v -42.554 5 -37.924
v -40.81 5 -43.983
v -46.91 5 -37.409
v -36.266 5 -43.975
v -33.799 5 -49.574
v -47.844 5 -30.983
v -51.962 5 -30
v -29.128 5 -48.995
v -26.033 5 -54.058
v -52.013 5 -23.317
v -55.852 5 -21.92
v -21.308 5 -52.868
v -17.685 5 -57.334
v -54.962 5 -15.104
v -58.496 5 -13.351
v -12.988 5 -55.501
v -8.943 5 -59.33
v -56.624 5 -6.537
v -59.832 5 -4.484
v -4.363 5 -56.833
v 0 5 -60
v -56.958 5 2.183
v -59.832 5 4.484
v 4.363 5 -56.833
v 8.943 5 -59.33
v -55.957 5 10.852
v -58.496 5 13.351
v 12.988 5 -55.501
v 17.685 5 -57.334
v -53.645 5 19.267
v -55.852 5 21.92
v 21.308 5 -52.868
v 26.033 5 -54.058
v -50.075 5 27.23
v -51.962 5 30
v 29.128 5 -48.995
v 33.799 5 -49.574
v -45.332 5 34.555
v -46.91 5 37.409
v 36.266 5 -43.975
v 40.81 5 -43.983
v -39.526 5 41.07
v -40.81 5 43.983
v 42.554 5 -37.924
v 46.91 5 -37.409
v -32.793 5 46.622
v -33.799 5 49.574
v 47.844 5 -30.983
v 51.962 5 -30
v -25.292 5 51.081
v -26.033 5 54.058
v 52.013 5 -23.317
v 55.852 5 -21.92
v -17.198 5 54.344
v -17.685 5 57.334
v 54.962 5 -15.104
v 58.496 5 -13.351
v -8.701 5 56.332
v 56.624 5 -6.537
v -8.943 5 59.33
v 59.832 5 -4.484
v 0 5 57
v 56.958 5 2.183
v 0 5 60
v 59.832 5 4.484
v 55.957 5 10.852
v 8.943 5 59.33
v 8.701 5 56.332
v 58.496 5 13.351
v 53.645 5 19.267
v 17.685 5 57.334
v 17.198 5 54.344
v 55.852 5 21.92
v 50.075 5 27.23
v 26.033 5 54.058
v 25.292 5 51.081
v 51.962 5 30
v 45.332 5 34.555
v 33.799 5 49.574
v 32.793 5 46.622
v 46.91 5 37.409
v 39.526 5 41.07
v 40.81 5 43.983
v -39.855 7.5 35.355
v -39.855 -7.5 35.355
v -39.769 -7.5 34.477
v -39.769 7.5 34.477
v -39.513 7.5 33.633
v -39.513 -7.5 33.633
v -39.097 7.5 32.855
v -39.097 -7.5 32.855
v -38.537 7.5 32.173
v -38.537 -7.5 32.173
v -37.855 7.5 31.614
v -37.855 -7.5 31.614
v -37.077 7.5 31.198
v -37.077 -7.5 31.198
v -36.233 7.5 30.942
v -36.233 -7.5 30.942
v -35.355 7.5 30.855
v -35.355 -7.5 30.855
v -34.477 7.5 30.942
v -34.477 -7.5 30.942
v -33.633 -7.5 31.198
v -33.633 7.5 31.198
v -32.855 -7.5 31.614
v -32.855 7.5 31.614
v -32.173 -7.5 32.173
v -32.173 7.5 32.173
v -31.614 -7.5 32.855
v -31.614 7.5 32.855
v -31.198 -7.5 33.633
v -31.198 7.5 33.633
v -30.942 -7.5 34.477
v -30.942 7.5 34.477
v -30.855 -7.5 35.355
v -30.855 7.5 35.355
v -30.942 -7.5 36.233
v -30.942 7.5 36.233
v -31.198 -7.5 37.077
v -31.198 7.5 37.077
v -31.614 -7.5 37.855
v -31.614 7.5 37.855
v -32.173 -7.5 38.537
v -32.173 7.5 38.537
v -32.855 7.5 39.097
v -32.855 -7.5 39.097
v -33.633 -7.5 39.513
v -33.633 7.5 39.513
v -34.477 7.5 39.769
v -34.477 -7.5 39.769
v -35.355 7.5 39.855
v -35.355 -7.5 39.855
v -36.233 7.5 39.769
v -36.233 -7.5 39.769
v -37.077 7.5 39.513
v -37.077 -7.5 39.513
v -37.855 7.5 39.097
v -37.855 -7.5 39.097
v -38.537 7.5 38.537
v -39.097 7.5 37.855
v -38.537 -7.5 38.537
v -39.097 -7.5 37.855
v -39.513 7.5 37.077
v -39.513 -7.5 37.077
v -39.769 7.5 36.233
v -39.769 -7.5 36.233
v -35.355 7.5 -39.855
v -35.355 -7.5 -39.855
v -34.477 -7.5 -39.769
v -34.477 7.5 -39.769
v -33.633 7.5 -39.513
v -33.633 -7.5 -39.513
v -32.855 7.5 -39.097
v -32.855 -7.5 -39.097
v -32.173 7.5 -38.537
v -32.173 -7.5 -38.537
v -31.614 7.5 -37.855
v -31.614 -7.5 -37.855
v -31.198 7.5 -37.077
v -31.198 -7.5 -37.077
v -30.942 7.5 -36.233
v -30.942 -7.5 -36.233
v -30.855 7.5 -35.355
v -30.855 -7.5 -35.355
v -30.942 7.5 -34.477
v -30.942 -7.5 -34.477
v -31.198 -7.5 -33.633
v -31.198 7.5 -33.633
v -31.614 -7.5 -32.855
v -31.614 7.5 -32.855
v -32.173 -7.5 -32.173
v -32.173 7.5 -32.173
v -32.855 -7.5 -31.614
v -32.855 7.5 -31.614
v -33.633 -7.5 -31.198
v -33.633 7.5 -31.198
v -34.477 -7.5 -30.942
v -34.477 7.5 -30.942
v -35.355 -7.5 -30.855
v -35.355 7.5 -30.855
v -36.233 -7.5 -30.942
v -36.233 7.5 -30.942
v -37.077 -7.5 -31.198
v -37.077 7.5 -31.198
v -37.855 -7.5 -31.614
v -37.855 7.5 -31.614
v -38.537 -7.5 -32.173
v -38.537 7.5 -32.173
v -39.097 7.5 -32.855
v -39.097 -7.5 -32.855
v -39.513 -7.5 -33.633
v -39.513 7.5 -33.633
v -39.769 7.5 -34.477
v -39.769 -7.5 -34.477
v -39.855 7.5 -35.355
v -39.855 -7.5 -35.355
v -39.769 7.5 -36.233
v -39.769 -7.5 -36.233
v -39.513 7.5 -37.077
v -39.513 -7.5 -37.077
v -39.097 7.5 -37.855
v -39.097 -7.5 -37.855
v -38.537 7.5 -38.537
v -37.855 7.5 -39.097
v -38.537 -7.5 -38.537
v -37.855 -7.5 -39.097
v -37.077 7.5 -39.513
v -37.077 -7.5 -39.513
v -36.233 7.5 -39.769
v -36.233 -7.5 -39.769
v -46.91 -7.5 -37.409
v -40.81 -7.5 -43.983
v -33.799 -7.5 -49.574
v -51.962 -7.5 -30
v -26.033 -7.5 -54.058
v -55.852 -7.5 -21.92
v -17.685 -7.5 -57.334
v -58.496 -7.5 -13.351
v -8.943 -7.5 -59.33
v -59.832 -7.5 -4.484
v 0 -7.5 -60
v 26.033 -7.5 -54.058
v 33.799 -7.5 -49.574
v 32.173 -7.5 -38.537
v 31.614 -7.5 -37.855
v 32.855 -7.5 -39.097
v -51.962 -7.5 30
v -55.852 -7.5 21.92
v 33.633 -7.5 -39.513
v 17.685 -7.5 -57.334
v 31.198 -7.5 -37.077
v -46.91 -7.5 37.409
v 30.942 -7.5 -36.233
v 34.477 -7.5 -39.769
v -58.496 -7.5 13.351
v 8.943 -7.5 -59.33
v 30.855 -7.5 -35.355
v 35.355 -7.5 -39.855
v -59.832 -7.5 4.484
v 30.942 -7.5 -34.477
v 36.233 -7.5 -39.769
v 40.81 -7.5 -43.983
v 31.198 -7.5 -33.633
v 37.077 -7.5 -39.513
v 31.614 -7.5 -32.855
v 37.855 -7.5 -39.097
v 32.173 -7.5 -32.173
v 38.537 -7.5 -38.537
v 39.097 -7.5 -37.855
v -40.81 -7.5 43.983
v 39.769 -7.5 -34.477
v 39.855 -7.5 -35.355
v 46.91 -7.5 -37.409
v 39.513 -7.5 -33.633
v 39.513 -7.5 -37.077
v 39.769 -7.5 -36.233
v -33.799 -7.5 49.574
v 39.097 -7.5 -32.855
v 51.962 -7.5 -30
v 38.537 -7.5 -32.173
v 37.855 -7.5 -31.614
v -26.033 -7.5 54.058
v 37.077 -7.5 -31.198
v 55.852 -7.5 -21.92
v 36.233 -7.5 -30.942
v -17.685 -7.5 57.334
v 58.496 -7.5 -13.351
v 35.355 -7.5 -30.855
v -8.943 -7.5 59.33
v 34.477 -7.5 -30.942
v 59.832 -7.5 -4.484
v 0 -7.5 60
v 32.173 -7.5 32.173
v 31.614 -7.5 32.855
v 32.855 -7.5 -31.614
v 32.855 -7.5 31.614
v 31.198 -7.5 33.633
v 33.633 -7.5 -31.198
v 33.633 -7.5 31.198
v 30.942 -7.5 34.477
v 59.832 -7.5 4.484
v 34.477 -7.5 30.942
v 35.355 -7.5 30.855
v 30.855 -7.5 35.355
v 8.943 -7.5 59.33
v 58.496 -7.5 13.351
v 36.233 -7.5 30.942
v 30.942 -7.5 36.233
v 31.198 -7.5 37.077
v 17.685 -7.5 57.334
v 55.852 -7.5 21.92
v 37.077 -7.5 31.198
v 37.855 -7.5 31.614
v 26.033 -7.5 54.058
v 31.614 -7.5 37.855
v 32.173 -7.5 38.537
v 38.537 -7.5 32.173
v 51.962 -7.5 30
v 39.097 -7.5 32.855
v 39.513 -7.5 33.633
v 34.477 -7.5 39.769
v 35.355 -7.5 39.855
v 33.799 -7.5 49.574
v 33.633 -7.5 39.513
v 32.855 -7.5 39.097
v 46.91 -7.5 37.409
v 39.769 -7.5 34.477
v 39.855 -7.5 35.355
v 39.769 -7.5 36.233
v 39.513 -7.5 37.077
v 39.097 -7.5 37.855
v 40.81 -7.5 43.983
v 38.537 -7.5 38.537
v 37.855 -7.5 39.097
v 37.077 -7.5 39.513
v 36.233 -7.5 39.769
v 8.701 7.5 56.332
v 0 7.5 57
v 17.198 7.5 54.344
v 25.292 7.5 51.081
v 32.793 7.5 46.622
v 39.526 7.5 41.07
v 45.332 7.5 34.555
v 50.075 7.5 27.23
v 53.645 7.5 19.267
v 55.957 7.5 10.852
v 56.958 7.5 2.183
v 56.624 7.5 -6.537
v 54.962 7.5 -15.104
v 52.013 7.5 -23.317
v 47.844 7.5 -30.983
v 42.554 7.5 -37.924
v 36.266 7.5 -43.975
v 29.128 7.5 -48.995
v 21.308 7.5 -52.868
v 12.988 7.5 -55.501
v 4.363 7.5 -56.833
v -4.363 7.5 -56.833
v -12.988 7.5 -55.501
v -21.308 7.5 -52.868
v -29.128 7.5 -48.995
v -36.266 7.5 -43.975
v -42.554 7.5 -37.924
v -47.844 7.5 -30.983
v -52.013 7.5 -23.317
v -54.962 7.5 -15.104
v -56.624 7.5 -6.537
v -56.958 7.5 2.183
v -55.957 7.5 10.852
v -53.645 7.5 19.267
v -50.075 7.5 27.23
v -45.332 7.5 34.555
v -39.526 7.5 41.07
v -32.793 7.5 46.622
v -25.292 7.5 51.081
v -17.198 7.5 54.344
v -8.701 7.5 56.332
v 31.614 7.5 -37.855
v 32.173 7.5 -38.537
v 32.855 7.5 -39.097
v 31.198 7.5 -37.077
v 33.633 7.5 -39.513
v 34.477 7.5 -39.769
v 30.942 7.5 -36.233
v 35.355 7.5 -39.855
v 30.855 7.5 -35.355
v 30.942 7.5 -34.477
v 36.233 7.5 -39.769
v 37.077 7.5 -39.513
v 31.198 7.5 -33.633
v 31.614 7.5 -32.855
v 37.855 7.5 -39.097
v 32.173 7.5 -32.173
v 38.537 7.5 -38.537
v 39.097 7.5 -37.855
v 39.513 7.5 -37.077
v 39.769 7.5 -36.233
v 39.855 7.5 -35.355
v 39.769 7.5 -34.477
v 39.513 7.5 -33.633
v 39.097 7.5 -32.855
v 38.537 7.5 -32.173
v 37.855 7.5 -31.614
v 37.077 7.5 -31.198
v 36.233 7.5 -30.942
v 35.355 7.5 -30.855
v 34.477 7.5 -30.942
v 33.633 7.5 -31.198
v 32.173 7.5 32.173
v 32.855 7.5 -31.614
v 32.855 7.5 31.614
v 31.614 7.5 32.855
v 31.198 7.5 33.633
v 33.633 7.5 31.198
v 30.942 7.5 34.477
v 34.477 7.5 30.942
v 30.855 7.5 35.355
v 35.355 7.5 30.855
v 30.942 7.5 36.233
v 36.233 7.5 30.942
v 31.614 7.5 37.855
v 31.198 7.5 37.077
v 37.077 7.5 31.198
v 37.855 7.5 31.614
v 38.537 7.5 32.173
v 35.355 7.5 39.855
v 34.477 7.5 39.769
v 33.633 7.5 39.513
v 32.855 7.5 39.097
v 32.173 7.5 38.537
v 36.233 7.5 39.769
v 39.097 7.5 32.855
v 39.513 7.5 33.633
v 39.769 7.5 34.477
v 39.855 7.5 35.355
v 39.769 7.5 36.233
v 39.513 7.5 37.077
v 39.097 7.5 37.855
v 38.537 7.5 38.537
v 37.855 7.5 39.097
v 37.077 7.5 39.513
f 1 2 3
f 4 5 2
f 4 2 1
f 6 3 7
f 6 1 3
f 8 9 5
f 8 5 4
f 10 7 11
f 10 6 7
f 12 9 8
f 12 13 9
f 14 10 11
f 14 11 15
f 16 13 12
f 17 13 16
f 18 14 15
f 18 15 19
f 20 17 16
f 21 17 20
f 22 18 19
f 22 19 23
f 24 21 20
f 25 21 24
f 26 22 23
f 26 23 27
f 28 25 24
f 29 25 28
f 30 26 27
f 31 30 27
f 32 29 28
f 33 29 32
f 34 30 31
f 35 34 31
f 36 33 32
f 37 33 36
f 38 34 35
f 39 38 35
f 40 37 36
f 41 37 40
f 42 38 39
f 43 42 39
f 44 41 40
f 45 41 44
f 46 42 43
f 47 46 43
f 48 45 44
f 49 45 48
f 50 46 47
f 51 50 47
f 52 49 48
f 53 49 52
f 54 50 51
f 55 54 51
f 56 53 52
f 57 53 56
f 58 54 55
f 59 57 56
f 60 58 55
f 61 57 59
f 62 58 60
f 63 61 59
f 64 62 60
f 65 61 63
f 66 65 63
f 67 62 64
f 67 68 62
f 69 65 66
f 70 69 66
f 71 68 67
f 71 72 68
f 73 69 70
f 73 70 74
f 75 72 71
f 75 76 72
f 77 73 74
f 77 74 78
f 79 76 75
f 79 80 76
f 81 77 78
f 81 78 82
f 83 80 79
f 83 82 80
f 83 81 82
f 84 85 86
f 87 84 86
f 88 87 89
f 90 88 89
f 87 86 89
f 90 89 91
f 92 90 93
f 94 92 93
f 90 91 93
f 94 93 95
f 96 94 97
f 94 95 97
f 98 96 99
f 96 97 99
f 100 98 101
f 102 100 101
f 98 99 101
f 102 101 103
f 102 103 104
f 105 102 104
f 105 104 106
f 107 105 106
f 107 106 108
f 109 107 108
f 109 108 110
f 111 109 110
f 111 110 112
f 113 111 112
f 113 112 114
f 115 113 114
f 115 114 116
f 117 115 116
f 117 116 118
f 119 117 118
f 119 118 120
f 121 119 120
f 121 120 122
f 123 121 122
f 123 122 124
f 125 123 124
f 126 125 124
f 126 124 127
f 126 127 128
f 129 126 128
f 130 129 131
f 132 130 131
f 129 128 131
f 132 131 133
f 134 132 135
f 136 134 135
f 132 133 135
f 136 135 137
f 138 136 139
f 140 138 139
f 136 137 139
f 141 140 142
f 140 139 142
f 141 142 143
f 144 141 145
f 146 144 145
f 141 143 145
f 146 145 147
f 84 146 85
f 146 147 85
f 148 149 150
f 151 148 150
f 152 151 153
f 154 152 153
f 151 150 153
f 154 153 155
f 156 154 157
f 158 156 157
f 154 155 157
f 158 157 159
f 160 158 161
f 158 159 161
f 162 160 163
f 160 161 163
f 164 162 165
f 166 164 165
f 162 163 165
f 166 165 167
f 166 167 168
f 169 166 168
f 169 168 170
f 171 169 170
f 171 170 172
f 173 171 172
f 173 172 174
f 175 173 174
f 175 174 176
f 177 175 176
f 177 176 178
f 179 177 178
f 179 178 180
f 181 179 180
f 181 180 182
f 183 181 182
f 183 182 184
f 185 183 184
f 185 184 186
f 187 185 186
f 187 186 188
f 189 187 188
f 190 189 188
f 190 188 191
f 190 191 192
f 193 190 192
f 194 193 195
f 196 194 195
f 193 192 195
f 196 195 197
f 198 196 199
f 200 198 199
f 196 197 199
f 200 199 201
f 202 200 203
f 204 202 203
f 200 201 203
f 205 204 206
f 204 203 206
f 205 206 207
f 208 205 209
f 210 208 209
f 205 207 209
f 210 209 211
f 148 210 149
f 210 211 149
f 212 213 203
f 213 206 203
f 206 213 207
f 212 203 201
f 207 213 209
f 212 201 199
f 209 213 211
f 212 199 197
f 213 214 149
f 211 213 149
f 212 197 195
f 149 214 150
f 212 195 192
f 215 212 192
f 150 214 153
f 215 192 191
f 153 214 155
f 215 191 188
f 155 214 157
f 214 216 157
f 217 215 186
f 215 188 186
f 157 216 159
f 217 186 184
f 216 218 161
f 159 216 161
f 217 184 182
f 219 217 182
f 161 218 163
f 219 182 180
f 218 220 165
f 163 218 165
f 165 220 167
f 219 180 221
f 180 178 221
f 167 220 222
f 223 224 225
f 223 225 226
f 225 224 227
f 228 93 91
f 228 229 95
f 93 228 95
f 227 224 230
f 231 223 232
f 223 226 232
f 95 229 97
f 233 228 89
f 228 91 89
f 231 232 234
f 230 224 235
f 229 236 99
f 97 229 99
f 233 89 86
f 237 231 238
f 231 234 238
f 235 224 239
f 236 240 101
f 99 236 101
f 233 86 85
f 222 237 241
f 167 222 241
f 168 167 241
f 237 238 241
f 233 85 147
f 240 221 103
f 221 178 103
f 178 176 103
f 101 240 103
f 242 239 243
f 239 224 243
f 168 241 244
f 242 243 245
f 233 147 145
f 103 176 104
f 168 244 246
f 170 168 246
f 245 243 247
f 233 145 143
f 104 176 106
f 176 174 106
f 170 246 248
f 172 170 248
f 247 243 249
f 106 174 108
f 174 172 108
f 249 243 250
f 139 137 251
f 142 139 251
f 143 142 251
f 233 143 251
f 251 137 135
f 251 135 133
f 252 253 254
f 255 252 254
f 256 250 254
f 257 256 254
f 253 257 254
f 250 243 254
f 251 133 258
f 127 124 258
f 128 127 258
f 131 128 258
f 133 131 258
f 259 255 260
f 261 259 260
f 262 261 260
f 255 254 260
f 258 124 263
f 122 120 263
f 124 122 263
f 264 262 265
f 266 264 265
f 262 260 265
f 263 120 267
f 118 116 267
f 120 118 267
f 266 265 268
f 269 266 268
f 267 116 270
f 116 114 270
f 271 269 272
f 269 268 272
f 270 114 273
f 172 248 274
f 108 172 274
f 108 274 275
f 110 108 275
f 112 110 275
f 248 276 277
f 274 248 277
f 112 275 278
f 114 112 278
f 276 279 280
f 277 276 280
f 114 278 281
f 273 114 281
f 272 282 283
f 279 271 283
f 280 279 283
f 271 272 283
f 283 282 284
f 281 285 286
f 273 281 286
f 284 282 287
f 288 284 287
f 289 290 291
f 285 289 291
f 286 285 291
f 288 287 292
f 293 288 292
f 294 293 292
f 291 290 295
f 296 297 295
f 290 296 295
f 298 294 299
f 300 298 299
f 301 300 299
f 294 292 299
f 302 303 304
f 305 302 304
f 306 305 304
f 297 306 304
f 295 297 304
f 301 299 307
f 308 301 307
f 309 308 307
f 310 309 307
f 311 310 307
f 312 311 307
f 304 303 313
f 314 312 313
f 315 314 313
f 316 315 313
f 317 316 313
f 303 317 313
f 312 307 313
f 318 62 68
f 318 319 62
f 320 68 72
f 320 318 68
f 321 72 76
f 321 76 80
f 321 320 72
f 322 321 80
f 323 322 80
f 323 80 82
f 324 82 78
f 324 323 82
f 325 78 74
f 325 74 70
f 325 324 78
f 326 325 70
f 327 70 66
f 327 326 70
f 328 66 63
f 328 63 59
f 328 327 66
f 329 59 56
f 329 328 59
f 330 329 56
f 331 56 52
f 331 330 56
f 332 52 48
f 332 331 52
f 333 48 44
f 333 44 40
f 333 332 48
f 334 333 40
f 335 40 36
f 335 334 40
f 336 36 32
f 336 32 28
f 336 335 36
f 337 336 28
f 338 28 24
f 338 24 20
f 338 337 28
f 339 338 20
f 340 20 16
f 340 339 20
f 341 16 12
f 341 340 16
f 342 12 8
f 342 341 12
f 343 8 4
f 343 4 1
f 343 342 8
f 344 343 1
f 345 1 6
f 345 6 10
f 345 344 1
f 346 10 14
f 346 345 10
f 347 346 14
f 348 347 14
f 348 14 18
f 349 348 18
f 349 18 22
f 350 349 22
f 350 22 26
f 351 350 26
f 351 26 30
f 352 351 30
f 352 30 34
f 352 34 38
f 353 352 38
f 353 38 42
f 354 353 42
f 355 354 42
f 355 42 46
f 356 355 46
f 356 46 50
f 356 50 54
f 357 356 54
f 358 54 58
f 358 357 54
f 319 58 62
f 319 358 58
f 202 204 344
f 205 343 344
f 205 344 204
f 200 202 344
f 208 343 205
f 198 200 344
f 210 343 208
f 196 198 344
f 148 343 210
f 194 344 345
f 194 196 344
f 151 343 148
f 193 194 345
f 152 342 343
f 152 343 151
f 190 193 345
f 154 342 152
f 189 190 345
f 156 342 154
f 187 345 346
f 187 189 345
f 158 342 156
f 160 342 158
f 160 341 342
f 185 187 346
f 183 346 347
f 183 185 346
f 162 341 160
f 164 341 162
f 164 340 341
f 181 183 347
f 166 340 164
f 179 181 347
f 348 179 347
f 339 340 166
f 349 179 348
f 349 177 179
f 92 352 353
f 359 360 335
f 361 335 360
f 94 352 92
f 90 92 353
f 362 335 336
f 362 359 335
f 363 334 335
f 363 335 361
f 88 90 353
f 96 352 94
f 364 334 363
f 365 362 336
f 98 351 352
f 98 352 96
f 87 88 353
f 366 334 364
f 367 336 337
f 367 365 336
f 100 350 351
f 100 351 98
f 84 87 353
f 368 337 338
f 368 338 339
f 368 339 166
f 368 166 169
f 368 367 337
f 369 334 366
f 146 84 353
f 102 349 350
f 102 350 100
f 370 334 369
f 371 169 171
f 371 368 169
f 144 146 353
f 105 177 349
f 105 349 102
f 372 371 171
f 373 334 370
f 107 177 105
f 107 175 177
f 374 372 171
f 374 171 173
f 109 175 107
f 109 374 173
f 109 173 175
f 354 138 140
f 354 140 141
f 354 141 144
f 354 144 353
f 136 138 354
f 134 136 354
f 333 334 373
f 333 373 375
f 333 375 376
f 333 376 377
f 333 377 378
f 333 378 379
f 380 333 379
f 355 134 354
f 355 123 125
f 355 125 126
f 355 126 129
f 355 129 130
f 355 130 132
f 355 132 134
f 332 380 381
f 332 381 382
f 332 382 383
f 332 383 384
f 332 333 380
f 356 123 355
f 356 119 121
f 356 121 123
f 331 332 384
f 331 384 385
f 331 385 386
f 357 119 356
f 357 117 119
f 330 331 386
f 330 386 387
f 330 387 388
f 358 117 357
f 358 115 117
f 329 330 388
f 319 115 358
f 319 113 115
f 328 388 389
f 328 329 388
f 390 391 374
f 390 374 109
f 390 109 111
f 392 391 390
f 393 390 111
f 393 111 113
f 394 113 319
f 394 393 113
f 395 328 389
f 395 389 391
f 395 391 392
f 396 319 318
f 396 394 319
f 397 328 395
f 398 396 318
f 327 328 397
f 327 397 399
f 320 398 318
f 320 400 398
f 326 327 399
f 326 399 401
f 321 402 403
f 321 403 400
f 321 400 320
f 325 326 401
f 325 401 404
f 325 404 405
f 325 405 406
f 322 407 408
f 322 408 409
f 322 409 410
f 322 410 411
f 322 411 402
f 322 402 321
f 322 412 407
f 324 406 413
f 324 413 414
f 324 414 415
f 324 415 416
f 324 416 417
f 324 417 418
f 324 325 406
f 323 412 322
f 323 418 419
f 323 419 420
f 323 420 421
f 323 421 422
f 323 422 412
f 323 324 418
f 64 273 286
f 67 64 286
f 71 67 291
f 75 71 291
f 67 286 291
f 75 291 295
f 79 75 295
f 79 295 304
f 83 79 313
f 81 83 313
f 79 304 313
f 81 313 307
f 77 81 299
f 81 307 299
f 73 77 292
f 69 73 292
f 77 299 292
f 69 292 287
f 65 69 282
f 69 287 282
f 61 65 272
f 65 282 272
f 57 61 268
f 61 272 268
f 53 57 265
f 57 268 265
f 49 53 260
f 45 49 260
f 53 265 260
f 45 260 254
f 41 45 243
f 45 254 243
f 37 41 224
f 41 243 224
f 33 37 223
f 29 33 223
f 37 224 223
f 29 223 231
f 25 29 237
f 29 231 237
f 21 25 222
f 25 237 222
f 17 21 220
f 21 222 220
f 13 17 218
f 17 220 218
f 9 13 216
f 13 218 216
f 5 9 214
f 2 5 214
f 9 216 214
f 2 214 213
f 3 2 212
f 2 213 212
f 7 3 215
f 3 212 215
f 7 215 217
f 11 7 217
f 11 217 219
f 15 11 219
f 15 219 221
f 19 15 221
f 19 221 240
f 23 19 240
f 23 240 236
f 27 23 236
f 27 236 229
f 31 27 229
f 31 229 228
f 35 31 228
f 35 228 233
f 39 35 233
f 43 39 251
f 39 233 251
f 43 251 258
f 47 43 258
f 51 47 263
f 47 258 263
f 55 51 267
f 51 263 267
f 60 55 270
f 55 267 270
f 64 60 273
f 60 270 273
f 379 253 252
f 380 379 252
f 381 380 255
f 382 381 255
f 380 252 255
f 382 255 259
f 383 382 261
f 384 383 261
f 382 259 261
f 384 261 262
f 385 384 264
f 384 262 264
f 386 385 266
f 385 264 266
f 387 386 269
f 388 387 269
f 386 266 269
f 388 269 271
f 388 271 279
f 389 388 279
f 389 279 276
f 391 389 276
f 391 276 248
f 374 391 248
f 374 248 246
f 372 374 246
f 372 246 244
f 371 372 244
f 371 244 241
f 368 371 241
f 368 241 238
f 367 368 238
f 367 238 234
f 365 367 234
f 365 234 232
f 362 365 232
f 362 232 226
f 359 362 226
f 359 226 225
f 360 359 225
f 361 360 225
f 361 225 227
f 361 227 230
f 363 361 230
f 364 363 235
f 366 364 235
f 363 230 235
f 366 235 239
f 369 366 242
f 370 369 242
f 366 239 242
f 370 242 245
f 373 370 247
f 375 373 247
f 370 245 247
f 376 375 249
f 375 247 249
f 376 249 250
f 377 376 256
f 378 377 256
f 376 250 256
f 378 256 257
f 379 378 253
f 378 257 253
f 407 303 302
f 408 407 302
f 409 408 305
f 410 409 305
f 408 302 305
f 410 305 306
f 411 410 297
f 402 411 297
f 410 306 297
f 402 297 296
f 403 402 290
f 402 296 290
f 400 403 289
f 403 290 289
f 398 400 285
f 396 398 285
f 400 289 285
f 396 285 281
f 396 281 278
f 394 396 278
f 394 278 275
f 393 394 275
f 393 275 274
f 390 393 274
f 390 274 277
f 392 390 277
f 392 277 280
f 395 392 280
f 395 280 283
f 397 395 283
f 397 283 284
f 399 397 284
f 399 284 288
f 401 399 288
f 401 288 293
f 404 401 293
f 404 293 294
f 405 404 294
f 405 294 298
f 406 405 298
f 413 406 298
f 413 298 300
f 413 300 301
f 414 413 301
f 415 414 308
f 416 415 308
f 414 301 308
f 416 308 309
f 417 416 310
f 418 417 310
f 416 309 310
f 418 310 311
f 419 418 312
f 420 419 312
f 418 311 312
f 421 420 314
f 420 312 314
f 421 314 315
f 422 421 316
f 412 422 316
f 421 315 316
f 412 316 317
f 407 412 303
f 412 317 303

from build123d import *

# Parameters (mm, degrees)
SKETCH1_R            = 57
EXTRUDE4_DEPTH       = 7.5
EXTRUDE5_DEPTH       = 5
EXTRUDE5_DEPTH_BACK  = 7.5
SKETCH_R             = 60
SKETCH_R_2           = 57
M8_CLEARANCE_HOLE3_D = 9
CIRPATTERN1_COUNT    = 4


with BuildPart() as part:
    # Sketch1 → Extrude4 (new, symmetric)
    with BuildSketch(Plane(origin=(0, 0, 0), x_dir=(1, 0, 0), z_dir=(0, 1, 0))):
        with Locations(Location((0, 0, 0), (0, 0, 270))):
            Circle(SKETCH1_R)
    extrude(amount=EXTRUDE4_DEPTH, both=True)

    # Sketch → Extrude5 (add, two sides: drawn at the far end of the back side and taken through both)
    with BuildSketch(Plane(origin=(0, 0, 0), x_dir=(1, 0, 0), z_dir=(0, 1, 0)).offset(-EXTRUDE5_DEPTH_BACK)):
        with Locations(Location((0, 0, 0), (0, 0, 270))):
            Circle(SKETCH_R)
        with Locations(Location((0, 0, 0), (0, 0, 270))):
            Circle(SKETCH_R_2, mode=Mode.SUBTRACT)
    extrude(amount=EXTRUDE5_DEPTH + EXTRUDE5_DEPTH_BACK)

    # M8 Clearance Hole3 (through all)
    with Locations(Plane(origin=(0, 7.5, 0), x_dir=(1, 0, 0), z_dir=(0, 1, 0))):
        with Locations((-35.355339059, -35.355339059)):
            m8_clearance_hole3 = Hole(M8_CLEARANCE_HOLE3_D / 2)

    # CirPattern1: M8 Clearance Hole3 ×4 about axis
    cirpattern1_axis = Axis((0, 0, 0), (0, 1, 0))
    for i in range(1, CIRPATTERN1_COUNT):
        add(m8_clearance_hole3.rotate(cirpattern1_axis, i * 360 / CIRPATTERN1_COUNT), mode=Mode.SUBTRACT)


solid = part.part
